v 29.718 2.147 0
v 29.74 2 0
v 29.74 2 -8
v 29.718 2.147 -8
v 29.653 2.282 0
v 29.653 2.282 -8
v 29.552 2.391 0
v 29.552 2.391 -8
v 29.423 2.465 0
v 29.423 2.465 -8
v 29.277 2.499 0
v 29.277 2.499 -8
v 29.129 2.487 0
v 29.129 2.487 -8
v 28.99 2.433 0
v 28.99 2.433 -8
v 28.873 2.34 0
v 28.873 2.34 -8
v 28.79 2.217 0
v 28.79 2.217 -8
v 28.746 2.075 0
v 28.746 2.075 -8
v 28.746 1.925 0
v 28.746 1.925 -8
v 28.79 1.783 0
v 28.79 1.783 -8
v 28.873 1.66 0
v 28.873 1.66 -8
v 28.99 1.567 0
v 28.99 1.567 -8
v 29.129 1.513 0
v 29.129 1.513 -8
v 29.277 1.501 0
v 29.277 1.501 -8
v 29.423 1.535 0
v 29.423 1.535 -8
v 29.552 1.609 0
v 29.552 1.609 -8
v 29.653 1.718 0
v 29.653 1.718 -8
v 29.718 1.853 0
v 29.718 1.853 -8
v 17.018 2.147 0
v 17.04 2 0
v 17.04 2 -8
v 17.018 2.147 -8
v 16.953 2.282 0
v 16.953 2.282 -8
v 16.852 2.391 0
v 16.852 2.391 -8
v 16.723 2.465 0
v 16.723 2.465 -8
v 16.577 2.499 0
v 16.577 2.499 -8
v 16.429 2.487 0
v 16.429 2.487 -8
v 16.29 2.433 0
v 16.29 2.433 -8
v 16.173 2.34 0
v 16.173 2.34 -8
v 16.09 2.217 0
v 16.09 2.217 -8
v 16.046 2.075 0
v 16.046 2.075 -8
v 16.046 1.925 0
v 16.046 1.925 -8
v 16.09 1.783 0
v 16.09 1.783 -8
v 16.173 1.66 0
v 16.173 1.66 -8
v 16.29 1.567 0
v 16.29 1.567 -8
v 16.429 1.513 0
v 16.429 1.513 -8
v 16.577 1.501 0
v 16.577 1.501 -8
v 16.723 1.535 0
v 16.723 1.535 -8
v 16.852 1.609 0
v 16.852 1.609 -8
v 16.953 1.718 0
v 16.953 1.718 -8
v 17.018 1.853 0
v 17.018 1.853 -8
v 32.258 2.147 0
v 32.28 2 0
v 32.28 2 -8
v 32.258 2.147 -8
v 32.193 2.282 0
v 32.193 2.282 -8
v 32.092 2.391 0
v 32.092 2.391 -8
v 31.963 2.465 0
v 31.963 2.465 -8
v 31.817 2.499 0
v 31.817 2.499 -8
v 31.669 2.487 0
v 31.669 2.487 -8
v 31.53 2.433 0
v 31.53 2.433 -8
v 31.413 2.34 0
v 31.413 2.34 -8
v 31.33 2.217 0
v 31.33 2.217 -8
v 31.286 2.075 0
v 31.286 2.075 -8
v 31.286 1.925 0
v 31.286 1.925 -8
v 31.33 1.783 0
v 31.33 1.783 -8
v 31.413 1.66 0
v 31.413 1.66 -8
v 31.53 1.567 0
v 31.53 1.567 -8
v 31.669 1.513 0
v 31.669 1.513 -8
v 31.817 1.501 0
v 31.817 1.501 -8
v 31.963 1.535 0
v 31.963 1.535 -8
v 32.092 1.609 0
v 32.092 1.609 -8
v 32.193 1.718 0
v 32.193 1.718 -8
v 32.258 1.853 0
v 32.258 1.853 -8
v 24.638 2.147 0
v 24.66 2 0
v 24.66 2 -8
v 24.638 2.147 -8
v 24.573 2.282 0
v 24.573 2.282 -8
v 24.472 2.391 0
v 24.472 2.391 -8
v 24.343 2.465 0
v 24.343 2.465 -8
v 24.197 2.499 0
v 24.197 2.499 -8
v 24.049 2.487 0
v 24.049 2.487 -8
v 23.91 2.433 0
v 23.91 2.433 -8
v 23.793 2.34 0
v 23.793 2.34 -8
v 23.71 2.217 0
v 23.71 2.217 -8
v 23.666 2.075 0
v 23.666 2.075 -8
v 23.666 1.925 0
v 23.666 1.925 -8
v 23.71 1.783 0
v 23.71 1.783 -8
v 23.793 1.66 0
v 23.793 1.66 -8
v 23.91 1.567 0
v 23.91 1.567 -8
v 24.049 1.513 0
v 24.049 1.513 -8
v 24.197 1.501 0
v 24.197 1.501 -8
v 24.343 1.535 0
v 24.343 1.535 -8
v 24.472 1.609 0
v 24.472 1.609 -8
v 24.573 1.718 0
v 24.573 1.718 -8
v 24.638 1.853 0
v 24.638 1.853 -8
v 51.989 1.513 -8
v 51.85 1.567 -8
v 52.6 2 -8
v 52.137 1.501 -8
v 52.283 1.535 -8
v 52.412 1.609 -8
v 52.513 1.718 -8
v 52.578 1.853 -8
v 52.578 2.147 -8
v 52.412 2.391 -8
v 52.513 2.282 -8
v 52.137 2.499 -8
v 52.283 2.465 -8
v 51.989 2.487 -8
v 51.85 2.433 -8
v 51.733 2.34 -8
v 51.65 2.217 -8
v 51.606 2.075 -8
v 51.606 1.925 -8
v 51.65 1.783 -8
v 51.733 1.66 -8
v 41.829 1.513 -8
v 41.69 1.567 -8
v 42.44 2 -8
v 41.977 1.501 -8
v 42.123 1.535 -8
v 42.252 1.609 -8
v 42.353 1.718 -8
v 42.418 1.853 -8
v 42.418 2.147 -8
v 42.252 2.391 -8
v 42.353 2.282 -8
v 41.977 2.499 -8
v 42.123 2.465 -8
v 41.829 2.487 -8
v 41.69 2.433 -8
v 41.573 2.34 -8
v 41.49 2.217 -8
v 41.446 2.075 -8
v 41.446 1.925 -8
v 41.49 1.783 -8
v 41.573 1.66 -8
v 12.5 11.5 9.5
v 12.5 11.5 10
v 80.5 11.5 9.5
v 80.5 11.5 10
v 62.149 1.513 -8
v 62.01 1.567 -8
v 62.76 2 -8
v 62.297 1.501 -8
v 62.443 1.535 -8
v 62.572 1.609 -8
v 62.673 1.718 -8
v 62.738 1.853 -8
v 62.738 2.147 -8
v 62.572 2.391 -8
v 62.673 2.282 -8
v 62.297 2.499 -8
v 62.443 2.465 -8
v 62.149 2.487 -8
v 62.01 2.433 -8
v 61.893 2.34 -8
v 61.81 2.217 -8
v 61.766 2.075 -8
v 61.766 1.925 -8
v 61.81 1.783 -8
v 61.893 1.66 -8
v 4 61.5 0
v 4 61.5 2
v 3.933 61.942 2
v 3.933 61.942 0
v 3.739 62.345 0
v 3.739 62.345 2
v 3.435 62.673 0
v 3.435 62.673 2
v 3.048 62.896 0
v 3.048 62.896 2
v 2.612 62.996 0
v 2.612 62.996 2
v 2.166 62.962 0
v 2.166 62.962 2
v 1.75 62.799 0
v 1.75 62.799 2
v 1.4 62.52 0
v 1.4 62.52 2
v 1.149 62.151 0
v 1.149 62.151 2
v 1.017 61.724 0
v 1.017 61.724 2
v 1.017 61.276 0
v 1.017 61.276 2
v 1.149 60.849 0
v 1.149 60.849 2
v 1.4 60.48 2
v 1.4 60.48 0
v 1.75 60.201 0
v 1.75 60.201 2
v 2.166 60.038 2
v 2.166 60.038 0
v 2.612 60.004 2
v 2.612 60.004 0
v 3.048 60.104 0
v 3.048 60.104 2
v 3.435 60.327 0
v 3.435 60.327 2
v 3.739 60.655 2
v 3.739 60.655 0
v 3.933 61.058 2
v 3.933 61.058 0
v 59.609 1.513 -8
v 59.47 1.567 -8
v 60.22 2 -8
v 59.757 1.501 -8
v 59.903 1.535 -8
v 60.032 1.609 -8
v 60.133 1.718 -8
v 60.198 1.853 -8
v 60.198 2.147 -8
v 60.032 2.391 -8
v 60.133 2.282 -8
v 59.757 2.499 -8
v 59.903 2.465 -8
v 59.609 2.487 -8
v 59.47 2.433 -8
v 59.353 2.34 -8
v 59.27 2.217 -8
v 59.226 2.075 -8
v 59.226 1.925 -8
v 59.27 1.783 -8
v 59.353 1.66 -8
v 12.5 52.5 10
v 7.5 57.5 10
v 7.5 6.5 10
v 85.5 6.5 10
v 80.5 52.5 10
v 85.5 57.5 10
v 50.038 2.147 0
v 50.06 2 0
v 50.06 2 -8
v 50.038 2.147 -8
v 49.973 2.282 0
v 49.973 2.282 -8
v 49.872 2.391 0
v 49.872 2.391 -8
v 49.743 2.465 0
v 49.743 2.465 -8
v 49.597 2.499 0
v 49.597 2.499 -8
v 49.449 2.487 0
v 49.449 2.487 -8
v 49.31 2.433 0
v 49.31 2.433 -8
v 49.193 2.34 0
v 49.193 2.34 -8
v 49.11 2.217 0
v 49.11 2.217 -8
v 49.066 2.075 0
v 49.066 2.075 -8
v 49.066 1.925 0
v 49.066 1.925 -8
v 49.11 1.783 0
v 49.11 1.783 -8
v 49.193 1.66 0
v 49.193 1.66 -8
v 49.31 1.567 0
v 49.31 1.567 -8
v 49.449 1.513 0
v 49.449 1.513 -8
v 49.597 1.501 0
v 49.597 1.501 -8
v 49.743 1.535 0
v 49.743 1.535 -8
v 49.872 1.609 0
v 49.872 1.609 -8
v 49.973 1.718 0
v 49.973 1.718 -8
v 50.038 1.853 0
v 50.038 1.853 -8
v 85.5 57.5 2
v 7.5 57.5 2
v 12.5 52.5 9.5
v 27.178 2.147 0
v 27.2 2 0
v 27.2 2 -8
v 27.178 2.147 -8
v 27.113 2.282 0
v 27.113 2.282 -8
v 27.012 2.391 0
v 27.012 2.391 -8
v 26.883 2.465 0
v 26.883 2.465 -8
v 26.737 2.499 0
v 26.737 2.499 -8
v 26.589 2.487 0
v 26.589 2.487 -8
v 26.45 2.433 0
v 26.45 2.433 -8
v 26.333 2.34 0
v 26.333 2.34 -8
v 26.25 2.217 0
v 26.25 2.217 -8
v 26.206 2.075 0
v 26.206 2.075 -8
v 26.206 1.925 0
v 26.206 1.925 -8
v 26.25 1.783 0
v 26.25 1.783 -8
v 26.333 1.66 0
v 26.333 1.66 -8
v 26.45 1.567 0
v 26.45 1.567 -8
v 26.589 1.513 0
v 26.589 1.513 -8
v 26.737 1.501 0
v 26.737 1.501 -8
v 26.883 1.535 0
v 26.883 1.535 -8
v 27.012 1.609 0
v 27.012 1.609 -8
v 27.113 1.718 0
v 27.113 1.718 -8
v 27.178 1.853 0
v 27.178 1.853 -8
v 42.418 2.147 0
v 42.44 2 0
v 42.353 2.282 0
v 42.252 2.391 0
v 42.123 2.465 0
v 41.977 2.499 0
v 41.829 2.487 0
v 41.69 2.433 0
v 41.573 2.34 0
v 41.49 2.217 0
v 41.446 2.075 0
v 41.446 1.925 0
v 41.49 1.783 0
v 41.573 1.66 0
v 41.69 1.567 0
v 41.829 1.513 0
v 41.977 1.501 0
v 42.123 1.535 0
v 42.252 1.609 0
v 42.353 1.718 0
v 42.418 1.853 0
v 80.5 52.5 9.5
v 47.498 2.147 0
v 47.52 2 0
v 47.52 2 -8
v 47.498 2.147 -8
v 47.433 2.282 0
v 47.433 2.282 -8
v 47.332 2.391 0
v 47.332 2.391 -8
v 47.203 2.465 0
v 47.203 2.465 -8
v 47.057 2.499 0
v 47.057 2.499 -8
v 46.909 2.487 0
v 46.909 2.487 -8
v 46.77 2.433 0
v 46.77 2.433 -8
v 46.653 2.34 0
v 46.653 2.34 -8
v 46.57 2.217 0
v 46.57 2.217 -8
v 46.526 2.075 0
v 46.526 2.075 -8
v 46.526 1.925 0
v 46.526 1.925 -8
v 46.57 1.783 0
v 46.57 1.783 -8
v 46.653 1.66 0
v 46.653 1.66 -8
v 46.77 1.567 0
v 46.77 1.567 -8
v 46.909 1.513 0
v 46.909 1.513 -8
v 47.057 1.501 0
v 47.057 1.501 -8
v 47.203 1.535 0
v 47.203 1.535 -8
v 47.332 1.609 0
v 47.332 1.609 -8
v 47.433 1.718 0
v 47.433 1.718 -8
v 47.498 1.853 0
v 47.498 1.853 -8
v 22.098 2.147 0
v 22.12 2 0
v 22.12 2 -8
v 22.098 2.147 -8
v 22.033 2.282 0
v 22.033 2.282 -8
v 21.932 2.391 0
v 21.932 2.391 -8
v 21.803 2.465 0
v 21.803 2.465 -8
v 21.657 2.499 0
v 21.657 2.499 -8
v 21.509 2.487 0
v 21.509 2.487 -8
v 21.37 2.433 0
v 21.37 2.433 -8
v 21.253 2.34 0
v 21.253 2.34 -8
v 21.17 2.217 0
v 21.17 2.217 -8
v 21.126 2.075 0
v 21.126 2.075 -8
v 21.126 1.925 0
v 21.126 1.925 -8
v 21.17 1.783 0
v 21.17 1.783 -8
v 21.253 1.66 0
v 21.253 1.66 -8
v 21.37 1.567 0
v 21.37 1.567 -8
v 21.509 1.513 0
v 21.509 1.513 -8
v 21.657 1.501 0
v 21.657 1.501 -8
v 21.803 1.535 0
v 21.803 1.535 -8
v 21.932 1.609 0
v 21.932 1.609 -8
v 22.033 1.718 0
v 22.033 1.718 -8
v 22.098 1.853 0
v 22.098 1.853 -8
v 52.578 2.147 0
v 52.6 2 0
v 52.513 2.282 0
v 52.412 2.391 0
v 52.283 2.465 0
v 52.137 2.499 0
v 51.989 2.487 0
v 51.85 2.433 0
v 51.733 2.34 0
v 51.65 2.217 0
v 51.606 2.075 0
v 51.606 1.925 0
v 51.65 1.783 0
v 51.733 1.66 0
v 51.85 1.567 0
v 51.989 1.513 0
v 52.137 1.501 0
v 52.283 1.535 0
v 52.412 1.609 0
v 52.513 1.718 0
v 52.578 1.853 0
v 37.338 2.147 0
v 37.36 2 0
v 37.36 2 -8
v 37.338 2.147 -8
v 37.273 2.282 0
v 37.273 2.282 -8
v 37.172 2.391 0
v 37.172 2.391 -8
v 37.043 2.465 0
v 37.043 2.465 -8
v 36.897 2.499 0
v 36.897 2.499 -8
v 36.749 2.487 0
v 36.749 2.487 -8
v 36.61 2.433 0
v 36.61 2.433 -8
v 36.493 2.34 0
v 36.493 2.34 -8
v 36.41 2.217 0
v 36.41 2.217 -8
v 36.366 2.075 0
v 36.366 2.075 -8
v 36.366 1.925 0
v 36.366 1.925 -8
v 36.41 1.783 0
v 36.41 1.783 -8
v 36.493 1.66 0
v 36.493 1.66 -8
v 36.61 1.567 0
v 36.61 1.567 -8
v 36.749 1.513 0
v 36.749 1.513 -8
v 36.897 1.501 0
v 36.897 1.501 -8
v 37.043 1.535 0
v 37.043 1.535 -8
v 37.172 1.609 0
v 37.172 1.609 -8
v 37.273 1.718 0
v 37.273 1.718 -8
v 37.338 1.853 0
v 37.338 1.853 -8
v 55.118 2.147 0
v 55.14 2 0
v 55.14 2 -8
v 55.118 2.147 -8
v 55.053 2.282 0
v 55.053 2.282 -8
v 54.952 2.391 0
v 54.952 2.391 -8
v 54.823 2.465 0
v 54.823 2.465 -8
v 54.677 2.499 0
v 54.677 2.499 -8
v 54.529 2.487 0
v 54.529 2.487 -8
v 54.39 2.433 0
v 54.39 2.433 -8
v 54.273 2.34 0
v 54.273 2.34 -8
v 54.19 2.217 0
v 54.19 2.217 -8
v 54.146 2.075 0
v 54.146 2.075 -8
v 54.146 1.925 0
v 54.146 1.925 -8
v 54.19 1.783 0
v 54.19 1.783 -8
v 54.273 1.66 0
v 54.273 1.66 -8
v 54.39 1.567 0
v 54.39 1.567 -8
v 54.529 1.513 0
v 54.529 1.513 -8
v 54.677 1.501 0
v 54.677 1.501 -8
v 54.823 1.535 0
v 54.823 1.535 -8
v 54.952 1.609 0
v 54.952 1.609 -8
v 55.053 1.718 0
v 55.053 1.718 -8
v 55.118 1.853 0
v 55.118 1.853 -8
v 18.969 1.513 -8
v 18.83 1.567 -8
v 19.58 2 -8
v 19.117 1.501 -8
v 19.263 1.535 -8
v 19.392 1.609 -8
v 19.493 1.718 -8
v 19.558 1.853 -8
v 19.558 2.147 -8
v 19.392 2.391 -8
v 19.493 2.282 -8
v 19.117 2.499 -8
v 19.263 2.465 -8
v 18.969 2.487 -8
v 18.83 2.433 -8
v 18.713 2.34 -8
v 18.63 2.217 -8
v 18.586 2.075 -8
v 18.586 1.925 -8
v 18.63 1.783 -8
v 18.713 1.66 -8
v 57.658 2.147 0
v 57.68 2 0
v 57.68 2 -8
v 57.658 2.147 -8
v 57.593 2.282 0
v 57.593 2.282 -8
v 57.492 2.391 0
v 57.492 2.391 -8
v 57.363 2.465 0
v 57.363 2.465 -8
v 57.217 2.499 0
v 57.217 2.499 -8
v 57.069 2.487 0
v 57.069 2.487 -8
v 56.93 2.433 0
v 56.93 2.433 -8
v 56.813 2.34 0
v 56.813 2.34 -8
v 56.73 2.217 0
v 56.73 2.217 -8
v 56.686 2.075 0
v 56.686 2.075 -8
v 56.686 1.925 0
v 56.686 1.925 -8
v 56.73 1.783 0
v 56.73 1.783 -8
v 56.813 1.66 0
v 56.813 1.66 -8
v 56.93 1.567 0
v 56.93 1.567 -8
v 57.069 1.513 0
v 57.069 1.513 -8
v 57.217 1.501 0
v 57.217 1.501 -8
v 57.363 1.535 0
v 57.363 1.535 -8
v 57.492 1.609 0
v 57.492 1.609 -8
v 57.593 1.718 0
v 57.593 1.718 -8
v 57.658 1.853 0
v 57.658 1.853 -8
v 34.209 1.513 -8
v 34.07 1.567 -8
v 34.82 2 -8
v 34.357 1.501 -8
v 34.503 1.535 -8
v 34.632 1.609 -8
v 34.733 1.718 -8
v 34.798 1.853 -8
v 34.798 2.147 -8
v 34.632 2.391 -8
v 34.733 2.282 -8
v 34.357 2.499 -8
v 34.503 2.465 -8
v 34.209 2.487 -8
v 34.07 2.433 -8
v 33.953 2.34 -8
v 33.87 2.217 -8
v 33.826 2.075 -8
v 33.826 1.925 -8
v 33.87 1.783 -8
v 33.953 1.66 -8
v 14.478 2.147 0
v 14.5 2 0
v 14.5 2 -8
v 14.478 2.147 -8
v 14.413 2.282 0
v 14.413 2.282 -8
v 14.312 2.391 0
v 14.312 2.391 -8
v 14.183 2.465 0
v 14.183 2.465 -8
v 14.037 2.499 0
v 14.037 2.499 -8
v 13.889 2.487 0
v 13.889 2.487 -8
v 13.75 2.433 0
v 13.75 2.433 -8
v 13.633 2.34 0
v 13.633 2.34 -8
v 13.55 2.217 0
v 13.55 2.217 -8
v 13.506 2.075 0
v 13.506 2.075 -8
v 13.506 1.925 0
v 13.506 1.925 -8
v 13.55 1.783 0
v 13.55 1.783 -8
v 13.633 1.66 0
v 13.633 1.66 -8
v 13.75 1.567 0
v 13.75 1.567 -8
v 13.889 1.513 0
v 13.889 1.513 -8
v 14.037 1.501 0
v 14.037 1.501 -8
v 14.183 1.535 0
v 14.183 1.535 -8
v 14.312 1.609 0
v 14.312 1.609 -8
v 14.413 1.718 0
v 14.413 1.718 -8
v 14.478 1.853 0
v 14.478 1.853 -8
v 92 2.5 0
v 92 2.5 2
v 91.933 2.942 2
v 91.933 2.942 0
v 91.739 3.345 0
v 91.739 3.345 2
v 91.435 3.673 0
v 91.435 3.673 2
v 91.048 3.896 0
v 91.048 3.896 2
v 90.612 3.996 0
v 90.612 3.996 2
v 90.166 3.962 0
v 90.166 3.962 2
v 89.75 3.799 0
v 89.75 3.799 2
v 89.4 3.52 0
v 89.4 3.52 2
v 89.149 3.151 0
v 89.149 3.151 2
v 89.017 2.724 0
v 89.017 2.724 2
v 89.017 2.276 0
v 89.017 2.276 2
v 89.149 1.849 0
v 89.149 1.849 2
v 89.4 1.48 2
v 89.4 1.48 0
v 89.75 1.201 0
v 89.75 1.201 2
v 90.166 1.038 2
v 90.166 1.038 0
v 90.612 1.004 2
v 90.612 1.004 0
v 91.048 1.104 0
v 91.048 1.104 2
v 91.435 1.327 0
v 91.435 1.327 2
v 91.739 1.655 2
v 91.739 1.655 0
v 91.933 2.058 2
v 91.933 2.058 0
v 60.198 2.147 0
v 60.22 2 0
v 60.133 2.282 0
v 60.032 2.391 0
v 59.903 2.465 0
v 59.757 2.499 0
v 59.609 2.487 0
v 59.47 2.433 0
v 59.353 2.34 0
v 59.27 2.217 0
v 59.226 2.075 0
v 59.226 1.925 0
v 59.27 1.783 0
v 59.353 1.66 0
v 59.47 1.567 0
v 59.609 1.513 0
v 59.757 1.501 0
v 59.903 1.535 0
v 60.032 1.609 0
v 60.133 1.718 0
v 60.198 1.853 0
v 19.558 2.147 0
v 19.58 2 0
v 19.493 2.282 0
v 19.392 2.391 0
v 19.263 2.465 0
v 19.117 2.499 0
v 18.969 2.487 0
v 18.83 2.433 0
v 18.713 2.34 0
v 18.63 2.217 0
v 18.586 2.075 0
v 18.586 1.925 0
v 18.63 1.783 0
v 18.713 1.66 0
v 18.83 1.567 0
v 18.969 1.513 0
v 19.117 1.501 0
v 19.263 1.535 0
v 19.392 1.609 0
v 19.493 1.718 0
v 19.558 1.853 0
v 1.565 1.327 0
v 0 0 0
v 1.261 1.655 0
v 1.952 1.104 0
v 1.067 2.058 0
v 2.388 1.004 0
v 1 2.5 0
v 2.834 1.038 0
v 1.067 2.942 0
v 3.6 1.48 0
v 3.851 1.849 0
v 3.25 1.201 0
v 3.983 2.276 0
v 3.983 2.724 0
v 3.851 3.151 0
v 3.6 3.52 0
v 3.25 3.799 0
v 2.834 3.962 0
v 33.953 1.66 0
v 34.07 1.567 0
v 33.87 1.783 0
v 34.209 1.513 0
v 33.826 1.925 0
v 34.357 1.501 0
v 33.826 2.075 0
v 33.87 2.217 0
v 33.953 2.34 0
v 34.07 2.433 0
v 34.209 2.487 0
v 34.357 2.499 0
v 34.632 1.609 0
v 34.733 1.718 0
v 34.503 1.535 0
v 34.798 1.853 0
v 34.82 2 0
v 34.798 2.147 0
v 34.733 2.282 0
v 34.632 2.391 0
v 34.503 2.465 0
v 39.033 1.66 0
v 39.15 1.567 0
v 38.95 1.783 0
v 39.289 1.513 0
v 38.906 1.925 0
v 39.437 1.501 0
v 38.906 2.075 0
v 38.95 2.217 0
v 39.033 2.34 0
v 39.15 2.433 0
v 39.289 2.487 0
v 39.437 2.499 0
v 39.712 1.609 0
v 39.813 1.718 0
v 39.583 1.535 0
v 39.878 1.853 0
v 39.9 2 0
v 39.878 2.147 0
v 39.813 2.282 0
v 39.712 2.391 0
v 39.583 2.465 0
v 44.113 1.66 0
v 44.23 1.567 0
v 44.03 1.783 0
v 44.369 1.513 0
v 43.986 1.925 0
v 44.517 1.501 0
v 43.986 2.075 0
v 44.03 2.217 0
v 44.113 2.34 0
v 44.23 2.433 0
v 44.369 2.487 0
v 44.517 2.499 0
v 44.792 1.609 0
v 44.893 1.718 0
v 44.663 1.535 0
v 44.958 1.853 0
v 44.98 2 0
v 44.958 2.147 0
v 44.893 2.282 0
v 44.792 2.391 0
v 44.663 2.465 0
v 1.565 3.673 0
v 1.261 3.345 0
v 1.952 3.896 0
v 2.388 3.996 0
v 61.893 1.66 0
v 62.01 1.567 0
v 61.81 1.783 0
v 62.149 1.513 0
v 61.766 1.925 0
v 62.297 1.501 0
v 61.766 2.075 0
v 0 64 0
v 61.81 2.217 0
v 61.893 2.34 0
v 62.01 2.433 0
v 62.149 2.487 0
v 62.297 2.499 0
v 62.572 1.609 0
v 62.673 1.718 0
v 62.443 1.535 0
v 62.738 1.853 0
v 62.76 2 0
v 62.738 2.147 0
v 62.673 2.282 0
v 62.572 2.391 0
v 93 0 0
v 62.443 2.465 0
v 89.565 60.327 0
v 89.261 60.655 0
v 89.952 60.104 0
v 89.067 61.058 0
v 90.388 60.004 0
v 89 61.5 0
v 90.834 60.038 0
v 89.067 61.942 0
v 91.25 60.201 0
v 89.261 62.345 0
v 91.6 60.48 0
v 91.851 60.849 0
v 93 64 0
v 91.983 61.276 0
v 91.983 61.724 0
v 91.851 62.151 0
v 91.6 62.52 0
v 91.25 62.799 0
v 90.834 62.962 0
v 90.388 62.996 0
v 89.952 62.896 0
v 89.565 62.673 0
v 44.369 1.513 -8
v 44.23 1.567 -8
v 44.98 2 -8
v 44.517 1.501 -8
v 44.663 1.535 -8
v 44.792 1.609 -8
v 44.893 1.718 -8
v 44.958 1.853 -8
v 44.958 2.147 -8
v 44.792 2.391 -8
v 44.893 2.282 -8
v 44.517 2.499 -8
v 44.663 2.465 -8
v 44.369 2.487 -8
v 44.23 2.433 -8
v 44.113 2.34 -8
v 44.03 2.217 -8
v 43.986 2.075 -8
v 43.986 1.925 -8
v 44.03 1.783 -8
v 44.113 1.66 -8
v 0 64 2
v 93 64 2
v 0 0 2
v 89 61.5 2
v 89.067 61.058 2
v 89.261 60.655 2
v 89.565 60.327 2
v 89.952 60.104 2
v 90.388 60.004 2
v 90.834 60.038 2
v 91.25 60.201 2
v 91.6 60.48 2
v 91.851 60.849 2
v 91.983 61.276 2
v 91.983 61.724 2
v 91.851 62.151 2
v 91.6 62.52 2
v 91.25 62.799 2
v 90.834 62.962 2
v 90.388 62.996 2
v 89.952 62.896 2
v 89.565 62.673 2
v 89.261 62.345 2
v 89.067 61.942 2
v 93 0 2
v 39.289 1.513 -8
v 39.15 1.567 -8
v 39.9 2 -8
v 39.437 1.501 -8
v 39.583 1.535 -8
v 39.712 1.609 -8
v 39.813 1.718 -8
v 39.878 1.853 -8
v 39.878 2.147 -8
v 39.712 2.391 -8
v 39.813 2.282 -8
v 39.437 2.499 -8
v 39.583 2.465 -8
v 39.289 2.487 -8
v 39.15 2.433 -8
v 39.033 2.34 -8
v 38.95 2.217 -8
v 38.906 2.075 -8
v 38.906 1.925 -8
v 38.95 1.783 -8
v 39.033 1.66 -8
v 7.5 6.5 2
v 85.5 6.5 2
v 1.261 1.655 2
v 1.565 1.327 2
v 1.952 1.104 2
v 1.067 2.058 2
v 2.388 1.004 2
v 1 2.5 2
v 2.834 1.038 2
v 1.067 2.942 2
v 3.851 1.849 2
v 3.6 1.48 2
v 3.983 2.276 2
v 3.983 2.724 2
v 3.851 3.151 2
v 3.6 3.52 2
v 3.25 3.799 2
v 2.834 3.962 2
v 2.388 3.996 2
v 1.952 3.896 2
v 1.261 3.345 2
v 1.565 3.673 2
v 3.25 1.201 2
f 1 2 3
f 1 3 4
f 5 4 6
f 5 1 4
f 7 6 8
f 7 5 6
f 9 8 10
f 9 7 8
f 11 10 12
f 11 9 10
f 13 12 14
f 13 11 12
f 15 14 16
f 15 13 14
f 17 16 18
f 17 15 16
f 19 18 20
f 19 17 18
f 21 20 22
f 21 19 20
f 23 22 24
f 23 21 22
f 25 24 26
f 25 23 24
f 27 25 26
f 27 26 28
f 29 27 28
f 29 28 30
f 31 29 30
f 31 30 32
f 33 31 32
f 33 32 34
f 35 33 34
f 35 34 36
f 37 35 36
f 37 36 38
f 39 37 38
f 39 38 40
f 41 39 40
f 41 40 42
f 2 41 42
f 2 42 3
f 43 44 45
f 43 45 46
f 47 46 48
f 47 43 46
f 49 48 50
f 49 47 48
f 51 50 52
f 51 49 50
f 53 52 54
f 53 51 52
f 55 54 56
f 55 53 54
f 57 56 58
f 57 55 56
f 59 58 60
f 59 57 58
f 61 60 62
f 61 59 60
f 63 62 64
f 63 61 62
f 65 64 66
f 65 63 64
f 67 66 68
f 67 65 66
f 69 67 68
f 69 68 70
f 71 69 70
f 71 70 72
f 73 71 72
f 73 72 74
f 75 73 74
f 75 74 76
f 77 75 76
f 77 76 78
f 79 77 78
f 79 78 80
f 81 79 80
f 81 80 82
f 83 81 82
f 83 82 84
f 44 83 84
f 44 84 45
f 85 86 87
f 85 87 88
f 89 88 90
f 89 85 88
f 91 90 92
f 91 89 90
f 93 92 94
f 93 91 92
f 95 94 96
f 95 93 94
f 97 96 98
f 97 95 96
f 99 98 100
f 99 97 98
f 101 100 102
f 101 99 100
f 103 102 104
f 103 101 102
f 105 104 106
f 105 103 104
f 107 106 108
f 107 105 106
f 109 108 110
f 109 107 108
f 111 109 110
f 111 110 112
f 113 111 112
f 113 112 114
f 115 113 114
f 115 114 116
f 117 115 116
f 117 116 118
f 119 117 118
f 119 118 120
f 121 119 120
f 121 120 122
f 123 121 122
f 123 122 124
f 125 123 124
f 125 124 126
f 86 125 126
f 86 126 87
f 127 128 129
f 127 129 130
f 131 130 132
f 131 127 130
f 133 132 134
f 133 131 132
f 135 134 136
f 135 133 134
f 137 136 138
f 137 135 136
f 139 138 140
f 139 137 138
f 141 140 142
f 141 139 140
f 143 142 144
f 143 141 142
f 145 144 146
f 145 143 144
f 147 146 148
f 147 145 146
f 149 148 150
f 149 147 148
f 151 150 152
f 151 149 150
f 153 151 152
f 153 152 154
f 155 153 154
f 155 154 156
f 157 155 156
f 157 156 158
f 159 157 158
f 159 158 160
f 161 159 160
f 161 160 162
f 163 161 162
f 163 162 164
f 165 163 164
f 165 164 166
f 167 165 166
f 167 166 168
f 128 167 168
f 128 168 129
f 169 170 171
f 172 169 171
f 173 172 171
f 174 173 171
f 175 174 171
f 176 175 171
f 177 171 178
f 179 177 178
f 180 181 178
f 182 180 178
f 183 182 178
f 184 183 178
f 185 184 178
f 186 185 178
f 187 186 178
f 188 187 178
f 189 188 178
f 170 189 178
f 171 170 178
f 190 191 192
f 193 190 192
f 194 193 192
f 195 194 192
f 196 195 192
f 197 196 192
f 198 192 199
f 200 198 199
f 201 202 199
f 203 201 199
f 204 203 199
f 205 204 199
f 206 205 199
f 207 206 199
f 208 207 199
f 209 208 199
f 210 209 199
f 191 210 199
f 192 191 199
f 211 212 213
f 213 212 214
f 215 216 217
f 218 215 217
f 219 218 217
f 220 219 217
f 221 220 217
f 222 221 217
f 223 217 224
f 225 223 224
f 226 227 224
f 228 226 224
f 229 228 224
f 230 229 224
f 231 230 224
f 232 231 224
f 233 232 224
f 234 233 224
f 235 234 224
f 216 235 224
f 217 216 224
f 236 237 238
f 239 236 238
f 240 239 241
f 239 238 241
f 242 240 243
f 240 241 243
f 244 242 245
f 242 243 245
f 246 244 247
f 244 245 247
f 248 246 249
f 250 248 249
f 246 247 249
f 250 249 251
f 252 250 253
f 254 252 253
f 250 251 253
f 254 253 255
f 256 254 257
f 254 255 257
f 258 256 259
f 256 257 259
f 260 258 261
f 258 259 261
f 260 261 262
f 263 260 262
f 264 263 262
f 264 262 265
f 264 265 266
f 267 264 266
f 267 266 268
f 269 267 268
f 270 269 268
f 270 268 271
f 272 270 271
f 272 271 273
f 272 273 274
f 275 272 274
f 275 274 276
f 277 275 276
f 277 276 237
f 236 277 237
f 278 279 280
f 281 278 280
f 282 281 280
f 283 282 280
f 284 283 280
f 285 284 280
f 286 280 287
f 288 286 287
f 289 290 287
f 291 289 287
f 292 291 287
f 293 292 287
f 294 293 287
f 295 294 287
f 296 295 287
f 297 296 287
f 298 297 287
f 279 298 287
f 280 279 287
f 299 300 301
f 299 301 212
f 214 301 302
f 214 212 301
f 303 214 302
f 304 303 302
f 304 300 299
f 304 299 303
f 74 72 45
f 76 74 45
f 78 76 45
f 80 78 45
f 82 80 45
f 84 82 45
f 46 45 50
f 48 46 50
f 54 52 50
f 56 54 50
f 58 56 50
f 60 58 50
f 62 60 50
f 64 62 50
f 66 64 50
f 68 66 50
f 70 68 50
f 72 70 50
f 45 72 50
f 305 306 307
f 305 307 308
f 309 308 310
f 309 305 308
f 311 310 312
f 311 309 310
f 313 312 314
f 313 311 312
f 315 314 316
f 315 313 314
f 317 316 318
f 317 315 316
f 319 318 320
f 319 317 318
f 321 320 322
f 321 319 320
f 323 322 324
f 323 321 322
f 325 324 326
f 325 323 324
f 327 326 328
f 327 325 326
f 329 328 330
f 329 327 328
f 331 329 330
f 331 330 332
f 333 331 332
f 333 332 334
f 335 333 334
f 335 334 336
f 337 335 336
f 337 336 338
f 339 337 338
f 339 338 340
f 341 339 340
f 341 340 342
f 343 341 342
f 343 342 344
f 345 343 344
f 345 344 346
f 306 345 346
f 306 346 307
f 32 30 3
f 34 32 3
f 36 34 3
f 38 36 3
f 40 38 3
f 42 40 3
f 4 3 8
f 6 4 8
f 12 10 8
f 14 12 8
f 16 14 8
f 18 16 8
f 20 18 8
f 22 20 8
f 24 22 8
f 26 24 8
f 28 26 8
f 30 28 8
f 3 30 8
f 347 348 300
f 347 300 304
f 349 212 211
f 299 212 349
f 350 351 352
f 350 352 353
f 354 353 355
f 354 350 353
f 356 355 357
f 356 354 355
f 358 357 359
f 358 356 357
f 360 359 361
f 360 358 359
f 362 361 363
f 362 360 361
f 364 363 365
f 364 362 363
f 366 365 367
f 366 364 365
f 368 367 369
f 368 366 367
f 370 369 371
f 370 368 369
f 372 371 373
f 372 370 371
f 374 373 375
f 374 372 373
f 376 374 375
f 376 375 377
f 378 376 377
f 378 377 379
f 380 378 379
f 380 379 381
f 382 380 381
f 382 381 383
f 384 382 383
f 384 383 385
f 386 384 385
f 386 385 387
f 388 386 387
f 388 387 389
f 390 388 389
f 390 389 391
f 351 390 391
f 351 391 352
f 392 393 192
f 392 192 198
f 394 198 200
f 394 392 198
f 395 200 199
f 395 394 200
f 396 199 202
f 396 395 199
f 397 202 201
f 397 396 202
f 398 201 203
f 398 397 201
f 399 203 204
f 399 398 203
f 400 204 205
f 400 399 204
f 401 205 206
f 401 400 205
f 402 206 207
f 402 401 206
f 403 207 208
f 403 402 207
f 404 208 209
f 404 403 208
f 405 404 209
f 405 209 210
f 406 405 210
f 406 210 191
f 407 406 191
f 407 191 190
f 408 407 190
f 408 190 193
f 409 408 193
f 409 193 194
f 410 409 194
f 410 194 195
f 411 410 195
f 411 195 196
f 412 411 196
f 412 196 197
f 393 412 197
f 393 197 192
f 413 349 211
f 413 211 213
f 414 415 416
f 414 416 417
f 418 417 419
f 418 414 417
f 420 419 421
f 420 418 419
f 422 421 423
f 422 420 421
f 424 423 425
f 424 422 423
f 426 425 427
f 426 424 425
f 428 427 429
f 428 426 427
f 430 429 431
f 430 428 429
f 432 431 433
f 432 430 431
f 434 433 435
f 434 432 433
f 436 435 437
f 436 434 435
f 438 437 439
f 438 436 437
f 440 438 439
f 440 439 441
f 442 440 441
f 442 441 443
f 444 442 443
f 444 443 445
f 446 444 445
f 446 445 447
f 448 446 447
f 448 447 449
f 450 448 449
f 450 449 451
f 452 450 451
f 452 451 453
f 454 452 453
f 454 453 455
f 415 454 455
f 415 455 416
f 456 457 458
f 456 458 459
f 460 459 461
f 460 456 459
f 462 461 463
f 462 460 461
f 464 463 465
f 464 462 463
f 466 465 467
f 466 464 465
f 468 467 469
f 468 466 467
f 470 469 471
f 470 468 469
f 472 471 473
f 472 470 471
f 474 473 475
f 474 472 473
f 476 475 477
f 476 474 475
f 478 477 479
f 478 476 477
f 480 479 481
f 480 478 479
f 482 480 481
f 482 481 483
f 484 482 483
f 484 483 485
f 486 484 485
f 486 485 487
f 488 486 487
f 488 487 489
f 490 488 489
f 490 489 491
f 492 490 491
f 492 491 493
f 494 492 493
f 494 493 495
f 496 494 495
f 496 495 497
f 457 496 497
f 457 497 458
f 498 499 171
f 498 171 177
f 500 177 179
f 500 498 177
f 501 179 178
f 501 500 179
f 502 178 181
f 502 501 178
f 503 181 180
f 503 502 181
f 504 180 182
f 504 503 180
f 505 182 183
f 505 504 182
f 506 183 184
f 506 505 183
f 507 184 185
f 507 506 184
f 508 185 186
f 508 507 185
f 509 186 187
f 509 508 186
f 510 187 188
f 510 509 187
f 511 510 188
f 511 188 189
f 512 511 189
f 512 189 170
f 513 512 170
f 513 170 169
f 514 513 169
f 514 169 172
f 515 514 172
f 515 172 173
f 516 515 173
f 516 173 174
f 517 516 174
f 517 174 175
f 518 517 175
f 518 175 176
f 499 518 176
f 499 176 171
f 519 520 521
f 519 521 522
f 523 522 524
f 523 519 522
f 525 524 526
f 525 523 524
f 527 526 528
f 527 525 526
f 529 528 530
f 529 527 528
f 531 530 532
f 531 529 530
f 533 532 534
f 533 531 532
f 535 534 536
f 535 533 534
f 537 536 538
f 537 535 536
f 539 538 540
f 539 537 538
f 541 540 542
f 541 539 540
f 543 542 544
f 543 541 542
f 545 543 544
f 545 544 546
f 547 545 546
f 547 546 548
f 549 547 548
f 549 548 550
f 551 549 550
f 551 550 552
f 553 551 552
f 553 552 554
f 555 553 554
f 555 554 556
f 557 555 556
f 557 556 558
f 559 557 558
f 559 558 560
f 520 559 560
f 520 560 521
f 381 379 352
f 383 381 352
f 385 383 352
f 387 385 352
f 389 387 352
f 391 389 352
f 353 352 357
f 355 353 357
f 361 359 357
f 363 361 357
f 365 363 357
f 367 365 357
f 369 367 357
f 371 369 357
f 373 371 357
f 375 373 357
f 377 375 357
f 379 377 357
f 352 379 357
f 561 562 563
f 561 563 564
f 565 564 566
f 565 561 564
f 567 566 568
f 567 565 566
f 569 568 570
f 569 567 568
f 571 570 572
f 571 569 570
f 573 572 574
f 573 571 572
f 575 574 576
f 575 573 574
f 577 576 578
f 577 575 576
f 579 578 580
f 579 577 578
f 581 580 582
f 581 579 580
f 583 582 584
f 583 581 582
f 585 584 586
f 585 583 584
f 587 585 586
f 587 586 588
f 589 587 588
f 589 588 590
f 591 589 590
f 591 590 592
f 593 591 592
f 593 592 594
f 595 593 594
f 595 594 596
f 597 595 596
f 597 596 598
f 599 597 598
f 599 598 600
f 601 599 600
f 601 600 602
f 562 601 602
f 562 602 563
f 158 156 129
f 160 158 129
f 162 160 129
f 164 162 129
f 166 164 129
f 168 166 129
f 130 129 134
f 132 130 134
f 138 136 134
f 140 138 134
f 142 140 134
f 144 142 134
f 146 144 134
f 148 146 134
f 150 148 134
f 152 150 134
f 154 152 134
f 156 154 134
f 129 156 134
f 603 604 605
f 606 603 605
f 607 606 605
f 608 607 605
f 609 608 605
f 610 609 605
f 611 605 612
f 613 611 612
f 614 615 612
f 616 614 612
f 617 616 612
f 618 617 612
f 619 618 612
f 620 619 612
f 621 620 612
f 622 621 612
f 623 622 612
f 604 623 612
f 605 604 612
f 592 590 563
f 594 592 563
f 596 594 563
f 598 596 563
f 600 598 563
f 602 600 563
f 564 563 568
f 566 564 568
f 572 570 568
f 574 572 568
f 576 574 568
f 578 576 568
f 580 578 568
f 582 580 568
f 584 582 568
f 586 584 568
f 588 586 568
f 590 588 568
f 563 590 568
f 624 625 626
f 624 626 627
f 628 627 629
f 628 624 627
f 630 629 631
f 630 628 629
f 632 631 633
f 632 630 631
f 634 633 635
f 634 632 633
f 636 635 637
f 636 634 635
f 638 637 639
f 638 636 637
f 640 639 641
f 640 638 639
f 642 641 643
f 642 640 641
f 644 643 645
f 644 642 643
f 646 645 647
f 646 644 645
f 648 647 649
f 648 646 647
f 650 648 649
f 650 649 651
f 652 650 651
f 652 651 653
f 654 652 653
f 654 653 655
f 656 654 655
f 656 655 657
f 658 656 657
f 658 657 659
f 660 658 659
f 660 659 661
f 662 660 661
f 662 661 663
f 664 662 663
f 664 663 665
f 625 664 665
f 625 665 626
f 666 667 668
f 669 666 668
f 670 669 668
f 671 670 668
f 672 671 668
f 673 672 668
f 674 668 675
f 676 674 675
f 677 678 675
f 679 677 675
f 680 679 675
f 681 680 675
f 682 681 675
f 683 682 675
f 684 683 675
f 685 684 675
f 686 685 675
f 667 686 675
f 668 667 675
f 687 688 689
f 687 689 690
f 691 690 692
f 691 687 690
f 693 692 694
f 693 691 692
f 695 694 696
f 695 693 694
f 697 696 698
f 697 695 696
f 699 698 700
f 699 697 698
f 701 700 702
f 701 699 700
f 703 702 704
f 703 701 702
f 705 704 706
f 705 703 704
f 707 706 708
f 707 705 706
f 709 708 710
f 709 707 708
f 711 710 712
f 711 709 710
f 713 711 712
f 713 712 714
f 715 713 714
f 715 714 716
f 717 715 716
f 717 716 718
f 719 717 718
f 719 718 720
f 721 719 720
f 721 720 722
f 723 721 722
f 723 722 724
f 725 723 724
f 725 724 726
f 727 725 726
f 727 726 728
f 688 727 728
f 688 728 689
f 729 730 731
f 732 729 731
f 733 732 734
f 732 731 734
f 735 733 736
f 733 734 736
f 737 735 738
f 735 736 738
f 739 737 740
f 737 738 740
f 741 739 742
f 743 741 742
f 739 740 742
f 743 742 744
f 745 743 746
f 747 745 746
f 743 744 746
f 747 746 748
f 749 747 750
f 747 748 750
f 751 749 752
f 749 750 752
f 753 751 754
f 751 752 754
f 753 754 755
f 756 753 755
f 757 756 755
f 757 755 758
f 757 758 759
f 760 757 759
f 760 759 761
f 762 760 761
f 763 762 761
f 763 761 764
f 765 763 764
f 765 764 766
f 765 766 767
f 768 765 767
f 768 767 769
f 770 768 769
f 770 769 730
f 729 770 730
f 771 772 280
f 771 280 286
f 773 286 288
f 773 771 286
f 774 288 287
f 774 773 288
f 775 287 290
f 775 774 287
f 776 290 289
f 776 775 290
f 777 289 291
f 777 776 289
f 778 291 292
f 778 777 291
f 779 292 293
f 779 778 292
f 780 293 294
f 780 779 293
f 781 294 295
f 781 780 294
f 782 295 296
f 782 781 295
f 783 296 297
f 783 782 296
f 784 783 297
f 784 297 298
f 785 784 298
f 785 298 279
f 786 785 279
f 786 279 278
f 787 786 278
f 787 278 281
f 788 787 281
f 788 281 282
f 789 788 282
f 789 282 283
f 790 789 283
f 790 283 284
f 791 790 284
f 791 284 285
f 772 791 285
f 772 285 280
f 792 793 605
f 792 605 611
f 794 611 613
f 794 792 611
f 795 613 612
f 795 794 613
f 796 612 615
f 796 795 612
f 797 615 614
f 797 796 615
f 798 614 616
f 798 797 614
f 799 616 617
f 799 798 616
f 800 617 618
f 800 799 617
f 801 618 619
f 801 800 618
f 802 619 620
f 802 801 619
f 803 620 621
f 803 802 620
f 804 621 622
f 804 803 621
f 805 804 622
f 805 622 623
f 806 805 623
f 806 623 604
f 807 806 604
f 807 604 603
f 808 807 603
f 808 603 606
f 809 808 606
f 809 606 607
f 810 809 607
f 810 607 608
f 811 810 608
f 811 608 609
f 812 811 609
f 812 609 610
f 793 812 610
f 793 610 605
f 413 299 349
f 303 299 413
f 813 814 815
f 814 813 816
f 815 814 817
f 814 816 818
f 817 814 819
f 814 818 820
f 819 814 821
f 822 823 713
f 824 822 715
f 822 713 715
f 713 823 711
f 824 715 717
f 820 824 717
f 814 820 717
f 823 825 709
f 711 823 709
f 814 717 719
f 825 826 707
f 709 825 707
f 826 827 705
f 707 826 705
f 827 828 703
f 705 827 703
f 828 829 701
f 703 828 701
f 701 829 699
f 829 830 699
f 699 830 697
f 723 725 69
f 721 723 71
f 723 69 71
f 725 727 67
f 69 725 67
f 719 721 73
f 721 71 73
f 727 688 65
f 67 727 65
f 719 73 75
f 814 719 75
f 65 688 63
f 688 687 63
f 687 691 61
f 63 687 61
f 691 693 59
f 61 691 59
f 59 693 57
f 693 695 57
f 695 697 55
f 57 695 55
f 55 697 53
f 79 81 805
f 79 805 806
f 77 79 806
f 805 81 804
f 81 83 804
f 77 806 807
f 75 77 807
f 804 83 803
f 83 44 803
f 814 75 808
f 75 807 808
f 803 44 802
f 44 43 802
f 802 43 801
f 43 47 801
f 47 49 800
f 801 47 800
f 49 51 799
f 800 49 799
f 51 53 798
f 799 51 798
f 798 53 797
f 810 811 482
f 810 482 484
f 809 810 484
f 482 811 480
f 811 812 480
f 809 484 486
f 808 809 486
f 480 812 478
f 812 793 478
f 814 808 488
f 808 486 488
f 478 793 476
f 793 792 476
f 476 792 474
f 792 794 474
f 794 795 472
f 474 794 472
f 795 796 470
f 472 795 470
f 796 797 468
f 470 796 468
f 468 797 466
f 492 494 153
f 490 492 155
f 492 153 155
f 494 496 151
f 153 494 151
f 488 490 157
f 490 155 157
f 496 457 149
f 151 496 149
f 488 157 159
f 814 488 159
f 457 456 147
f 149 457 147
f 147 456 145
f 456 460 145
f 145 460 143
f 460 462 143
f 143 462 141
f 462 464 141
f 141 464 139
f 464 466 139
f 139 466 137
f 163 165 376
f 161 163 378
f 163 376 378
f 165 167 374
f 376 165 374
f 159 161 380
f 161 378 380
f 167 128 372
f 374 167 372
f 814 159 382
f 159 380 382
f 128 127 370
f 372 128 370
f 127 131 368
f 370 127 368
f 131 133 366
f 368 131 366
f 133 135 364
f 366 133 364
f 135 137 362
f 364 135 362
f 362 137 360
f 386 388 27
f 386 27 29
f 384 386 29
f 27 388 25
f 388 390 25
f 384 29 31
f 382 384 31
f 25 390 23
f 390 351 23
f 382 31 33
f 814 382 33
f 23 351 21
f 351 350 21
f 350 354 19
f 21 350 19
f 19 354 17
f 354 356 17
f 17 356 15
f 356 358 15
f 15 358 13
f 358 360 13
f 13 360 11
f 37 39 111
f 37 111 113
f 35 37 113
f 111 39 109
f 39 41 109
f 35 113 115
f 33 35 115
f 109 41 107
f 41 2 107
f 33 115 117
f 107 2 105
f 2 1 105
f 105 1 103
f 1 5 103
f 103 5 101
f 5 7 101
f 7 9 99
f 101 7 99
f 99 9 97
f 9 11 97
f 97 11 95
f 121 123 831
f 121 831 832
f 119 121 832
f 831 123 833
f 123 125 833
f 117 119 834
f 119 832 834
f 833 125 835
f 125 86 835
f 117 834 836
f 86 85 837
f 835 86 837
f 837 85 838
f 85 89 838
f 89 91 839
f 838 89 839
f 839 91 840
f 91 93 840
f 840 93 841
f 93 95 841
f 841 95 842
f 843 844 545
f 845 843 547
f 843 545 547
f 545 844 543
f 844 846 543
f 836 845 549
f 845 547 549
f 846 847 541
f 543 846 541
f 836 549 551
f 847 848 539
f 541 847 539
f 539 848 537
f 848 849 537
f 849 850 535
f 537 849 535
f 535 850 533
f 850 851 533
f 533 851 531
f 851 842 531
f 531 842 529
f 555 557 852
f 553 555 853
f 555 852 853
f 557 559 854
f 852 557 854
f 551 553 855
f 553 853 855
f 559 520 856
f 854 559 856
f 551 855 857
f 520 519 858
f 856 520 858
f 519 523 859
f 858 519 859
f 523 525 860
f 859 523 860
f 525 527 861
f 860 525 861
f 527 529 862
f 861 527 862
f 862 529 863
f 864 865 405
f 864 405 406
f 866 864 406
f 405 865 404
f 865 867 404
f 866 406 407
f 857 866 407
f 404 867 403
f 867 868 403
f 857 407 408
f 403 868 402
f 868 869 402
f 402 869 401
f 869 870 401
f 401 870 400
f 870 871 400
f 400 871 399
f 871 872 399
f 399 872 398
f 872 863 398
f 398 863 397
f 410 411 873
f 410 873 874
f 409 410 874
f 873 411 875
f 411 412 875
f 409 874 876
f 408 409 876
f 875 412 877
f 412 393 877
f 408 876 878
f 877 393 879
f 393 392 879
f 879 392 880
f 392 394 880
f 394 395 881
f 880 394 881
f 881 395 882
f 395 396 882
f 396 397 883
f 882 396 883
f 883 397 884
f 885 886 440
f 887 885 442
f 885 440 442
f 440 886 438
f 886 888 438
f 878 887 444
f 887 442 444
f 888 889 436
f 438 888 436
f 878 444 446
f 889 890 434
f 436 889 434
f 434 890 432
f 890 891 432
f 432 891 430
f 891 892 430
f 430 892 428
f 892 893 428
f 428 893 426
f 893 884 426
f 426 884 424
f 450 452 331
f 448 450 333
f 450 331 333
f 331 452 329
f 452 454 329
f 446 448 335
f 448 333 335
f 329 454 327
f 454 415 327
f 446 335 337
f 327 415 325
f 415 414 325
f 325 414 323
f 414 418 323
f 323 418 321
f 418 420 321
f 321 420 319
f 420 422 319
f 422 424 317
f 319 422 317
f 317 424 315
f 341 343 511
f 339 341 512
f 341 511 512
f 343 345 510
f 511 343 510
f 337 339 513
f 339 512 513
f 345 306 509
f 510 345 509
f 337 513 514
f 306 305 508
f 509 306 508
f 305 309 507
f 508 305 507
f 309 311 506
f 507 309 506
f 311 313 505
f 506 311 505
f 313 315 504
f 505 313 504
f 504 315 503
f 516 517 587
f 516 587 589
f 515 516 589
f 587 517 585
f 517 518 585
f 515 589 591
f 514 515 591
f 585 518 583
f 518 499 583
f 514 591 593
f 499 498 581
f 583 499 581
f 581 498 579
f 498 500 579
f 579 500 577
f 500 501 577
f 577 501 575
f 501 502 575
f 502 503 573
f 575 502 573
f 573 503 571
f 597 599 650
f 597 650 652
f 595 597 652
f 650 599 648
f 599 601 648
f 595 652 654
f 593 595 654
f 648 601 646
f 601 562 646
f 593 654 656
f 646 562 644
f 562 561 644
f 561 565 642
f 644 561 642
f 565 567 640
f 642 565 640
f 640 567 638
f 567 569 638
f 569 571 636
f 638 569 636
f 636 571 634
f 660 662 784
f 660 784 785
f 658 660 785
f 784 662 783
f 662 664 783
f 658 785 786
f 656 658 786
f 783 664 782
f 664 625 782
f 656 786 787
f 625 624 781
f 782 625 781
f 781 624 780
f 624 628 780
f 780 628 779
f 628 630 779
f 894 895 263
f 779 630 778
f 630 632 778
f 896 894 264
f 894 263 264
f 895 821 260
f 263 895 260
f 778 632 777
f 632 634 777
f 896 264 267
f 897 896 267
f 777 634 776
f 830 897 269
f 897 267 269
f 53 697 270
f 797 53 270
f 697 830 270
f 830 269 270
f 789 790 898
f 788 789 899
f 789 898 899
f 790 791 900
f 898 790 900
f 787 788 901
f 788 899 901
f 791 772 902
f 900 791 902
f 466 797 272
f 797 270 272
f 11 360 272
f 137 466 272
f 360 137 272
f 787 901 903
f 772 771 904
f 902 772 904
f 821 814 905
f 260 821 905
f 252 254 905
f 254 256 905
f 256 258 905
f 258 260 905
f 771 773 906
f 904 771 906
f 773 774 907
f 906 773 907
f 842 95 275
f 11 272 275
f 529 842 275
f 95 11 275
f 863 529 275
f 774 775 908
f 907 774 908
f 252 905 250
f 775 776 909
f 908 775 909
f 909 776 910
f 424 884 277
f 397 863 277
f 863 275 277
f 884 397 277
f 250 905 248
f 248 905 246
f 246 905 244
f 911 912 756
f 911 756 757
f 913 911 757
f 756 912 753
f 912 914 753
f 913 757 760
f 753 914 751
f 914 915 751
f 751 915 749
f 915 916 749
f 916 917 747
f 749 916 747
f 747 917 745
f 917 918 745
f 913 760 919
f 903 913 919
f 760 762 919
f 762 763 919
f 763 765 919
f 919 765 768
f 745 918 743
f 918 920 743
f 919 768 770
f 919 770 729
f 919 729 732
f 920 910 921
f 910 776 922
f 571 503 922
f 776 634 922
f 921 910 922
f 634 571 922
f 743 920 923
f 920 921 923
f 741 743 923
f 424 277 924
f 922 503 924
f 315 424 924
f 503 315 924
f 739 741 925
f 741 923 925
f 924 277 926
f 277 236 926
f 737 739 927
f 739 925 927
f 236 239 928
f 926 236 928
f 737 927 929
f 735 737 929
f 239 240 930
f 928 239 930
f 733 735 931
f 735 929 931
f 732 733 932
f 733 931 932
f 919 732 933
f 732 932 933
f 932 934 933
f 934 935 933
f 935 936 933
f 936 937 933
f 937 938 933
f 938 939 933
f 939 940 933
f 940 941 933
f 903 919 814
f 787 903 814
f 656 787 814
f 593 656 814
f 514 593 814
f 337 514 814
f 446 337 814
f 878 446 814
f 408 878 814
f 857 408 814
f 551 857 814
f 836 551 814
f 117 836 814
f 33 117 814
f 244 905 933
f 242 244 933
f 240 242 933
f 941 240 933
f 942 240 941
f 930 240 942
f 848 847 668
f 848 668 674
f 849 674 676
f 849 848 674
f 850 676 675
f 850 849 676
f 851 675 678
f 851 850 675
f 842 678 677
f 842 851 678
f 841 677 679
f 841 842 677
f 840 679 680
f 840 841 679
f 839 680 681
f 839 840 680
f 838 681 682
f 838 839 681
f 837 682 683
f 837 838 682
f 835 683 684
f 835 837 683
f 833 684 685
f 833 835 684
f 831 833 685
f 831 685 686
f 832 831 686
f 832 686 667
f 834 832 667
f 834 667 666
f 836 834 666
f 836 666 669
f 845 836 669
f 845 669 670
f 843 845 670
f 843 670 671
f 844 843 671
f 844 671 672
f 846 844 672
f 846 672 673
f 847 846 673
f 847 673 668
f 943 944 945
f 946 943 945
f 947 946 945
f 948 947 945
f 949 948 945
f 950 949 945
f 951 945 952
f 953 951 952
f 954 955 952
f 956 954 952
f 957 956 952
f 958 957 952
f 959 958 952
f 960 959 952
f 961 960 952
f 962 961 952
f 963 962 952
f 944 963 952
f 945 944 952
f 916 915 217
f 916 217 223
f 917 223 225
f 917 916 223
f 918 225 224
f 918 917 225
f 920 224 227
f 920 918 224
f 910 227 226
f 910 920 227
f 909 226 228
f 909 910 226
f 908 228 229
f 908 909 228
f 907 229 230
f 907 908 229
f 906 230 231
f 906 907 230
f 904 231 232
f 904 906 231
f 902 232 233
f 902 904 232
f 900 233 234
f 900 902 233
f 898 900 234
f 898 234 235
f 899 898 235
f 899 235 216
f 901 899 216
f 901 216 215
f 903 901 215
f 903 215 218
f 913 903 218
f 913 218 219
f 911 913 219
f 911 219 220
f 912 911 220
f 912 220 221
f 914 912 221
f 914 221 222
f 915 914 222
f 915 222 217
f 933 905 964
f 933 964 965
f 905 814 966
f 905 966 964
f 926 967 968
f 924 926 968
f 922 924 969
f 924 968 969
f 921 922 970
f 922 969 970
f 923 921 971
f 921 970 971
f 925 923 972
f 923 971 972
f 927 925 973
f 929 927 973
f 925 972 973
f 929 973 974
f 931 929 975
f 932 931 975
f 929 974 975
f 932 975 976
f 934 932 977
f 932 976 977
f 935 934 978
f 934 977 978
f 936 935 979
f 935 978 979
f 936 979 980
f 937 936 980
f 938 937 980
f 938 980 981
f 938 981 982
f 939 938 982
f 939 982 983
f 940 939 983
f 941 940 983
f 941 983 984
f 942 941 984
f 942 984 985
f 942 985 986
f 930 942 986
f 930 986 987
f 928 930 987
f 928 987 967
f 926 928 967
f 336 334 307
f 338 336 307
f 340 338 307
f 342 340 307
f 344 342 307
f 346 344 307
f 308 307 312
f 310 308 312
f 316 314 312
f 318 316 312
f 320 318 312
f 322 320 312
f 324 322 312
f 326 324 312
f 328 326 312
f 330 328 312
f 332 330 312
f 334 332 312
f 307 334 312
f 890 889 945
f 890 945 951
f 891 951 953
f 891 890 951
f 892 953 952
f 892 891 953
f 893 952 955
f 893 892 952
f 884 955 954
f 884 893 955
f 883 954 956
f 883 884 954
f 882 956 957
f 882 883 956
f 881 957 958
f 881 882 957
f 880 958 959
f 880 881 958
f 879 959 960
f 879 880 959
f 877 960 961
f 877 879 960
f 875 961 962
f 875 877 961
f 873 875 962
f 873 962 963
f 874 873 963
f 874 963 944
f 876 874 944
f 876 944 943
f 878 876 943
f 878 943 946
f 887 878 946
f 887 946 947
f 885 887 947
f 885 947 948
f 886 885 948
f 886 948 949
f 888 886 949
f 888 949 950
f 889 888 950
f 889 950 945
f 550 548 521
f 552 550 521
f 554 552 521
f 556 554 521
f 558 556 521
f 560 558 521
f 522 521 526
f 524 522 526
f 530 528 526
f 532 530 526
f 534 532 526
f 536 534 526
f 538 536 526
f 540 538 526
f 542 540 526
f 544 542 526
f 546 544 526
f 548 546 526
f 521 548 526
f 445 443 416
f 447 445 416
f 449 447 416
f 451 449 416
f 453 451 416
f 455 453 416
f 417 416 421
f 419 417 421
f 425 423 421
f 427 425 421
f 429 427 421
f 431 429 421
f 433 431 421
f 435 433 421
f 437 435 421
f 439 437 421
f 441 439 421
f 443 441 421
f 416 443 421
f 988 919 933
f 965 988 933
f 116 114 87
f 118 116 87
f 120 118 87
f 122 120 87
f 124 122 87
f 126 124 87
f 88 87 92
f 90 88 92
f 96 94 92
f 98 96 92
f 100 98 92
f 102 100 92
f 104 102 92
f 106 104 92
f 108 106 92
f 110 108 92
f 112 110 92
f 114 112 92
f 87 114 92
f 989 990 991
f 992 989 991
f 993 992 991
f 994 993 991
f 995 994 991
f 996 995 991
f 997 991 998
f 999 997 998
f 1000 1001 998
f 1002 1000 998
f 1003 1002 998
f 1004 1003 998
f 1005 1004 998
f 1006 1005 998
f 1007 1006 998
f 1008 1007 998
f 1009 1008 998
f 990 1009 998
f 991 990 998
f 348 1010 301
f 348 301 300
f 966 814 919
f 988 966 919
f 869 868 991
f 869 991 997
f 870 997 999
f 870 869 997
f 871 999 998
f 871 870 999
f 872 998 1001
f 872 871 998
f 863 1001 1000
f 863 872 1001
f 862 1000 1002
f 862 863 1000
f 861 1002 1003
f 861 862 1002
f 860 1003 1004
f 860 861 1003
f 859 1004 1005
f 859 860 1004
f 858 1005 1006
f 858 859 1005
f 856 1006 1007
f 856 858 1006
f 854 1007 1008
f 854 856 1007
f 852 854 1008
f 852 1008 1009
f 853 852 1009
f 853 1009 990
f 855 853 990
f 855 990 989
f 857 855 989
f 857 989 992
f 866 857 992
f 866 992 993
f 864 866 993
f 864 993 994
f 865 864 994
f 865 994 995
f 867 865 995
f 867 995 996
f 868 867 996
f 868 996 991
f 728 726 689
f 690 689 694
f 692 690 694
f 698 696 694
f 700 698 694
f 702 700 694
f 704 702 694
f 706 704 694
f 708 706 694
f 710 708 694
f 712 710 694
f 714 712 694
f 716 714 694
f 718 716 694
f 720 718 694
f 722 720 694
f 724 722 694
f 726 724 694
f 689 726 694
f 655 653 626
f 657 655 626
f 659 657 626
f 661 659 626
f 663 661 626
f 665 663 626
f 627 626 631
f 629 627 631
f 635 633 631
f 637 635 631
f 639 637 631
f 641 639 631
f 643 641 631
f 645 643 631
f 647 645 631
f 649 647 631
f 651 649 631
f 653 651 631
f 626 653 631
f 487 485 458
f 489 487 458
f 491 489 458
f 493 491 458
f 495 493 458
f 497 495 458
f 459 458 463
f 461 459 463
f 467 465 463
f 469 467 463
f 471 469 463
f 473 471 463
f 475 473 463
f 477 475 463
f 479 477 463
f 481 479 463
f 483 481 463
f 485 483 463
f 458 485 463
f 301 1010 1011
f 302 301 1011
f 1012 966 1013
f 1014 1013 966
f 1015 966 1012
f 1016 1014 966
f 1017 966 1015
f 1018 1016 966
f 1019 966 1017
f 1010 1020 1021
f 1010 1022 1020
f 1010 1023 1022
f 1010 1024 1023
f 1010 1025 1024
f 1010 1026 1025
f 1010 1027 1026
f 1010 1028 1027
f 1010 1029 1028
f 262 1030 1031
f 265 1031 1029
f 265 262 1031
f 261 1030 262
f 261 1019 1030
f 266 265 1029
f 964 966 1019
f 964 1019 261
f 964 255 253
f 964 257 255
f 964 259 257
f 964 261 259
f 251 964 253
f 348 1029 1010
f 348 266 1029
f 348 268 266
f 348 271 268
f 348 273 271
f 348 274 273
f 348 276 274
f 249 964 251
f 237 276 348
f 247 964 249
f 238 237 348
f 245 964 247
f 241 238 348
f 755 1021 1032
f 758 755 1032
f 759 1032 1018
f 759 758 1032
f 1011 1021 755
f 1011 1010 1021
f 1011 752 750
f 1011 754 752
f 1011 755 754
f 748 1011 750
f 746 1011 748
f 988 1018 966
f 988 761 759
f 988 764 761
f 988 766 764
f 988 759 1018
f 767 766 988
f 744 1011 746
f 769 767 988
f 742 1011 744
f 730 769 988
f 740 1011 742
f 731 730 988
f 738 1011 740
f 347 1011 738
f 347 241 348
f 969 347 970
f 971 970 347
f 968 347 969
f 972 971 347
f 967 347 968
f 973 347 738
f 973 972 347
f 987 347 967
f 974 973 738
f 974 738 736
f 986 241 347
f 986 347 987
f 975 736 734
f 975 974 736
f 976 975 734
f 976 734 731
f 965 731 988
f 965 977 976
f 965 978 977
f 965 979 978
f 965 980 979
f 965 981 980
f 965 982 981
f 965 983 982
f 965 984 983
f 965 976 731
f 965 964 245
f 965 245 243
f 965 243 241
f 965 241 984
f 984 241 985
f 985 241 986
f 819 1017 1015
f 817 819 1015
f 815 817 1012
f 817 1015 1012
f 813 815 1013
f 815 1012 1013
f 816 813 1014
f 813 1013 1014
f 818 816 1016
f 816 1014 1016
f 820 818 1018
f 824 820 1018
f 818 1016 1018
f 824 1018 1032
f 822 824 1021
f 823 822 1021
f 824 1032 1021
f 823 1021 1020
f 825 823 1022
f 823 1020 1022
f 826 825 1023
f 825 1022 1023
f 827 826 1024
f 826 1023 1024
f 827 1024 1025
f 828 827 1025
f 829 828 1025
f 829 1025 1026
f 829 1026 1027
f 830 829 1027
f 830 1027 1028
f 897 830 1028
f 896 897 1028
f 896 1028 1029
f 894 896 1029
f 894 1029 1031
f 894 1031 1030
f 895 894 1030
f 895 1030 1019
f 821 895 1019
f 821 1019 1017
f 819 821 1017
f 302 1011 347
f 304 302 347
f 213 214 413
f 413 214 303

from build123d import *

# Parameters (mm, degrees)
SKETCH_1_W          = 93
SKETCH_1_H          = 64
EXTRUDE_1_DEPTH     = 2
SKETCH_3_W          = 78
SKETCH_3_H          = 51
EXTRUDE_2_DEPTH     = 8
SKETCH_4_R          = 1.5
CUT_EXTRUDE_1_DEPTH = 114.176852757
SKETCH_5_W          = 68
SKETCH_5_H          = 41
CUT_EXTRUDE_2_DEPTH = 0.5
SKETCH_6_R          = 0.5
EXTRUDE_3_DEPTH     = 10


with BuildPart() as part:
    # 草图1 → 凸台-拉伸1 (new body)
    with BuildSketch(Plane.XY):
        with Locations((46.5, 32)):
            Rectangle(SKETCH_1_W, SKETCH_1_H)
    extrude(amount=EXTRUDE_1_DEPTH)

    # 草图3 → 凸台-拉伸2 (add)
    with BuildSketch(Plane.XY.offset(2)):
        with Locations((46.5, 32)):
            Rectangle(SKETCH_3_W, SKETCH_3_H)
    extrude(amount=EXTRUDE_2_DEPTH)

    # 草图4 → 切除-拉伸1 (cut, through all)
    with BuildSketch(Plane.XY.offset(2)):
        with Locations((2.5, 61.5)):
            Circle(SKETCH_4_R)
        with Locations(Location((90.5, 61.5, 0), (0, 0, 180))):
            Circle(SKETCH_4_R)
        with Locations((90.5, 2.5)):
            Circle(SKETCH_4_R)
        with Locations(Location((2.5, 2.5, 0), (0, 0, 180))):
            Circle(SKETCH_4_R)
    extrude(amount=-CUT_EXTRUDE_1_DEPTH, mode=Mode.SUBTRACT)

    # 草图5 → 切除-拉伸2 (cut)
    with BuildSketch(Plane.XY.offset(10)):
        with Locations((46.5, 32)):
            Rectangle(SKETCH_5_W, SKETCH_5_H)
    extrude(amount=-CUT_EXTRUDE_2_DEPTH, mode=Mode.SUBTRACT)

    # 草图6 → 凸台-拉伸3 (add)
    with BuildSketch(Plane.XY.offset(2)):
        with Locations((14, 2)):
            Circle(SKETCH_6_R)
        with Locations((16.54, 2)):
            Circle(SKETCH_6_R)
        with Locations((19.08, 2)):
            Circle(SKETCH_6_R)
        with Locations((21.62, 2)):
            Circle(SKETCH_6_R)
        with Locations((24.16, 2)):
            Circle(SKETCH_6_R)
        with Locations((26.7, 2)):
            Circle(SKETCH_6_R)
        with Locations((29.24, 2)):
            Circle(SKETCH_6_R)
        with Locations((31.78, 2)):
            Circle(SKETCH_6_R)
        with Locations((34.32, 2)):
            Circle(SKETCH_6_R)
        with Locations((36.86, 2)):
            Circle(SKETCH_6_R)
        with Locations((39.4, 2)):
            Circle(SKETCH_6_R)
        with Locations((41.94, 2)):
            Circle(SKETCH_6_R)
        with Locations((44.48, 2)):
            Circle(SKETCH_6_R)
        with Locations((47.02, 2)):
            Circle(SKETCH_6_R)
        with Locations((49.56, 2)):
            Circle(SKETCH_6_R)
        with Locations((52.1, 2)):
            Circle(SKETCH_6_R)
        with Locations((54.64, 2)):
            Circle(SKETCH_6_R)
        with Locations((57.18, 2)):
            Circle(SKETCH_6_R)
        with Locations((59.72, 2)):
            Circle(SKETCH_6_R)
        with Locations((62.26, 2)):
            Circle(SKETCH_6_R)
    extrude(amount=-EXTRUDE_3_DEPTH)


solid = part.part
